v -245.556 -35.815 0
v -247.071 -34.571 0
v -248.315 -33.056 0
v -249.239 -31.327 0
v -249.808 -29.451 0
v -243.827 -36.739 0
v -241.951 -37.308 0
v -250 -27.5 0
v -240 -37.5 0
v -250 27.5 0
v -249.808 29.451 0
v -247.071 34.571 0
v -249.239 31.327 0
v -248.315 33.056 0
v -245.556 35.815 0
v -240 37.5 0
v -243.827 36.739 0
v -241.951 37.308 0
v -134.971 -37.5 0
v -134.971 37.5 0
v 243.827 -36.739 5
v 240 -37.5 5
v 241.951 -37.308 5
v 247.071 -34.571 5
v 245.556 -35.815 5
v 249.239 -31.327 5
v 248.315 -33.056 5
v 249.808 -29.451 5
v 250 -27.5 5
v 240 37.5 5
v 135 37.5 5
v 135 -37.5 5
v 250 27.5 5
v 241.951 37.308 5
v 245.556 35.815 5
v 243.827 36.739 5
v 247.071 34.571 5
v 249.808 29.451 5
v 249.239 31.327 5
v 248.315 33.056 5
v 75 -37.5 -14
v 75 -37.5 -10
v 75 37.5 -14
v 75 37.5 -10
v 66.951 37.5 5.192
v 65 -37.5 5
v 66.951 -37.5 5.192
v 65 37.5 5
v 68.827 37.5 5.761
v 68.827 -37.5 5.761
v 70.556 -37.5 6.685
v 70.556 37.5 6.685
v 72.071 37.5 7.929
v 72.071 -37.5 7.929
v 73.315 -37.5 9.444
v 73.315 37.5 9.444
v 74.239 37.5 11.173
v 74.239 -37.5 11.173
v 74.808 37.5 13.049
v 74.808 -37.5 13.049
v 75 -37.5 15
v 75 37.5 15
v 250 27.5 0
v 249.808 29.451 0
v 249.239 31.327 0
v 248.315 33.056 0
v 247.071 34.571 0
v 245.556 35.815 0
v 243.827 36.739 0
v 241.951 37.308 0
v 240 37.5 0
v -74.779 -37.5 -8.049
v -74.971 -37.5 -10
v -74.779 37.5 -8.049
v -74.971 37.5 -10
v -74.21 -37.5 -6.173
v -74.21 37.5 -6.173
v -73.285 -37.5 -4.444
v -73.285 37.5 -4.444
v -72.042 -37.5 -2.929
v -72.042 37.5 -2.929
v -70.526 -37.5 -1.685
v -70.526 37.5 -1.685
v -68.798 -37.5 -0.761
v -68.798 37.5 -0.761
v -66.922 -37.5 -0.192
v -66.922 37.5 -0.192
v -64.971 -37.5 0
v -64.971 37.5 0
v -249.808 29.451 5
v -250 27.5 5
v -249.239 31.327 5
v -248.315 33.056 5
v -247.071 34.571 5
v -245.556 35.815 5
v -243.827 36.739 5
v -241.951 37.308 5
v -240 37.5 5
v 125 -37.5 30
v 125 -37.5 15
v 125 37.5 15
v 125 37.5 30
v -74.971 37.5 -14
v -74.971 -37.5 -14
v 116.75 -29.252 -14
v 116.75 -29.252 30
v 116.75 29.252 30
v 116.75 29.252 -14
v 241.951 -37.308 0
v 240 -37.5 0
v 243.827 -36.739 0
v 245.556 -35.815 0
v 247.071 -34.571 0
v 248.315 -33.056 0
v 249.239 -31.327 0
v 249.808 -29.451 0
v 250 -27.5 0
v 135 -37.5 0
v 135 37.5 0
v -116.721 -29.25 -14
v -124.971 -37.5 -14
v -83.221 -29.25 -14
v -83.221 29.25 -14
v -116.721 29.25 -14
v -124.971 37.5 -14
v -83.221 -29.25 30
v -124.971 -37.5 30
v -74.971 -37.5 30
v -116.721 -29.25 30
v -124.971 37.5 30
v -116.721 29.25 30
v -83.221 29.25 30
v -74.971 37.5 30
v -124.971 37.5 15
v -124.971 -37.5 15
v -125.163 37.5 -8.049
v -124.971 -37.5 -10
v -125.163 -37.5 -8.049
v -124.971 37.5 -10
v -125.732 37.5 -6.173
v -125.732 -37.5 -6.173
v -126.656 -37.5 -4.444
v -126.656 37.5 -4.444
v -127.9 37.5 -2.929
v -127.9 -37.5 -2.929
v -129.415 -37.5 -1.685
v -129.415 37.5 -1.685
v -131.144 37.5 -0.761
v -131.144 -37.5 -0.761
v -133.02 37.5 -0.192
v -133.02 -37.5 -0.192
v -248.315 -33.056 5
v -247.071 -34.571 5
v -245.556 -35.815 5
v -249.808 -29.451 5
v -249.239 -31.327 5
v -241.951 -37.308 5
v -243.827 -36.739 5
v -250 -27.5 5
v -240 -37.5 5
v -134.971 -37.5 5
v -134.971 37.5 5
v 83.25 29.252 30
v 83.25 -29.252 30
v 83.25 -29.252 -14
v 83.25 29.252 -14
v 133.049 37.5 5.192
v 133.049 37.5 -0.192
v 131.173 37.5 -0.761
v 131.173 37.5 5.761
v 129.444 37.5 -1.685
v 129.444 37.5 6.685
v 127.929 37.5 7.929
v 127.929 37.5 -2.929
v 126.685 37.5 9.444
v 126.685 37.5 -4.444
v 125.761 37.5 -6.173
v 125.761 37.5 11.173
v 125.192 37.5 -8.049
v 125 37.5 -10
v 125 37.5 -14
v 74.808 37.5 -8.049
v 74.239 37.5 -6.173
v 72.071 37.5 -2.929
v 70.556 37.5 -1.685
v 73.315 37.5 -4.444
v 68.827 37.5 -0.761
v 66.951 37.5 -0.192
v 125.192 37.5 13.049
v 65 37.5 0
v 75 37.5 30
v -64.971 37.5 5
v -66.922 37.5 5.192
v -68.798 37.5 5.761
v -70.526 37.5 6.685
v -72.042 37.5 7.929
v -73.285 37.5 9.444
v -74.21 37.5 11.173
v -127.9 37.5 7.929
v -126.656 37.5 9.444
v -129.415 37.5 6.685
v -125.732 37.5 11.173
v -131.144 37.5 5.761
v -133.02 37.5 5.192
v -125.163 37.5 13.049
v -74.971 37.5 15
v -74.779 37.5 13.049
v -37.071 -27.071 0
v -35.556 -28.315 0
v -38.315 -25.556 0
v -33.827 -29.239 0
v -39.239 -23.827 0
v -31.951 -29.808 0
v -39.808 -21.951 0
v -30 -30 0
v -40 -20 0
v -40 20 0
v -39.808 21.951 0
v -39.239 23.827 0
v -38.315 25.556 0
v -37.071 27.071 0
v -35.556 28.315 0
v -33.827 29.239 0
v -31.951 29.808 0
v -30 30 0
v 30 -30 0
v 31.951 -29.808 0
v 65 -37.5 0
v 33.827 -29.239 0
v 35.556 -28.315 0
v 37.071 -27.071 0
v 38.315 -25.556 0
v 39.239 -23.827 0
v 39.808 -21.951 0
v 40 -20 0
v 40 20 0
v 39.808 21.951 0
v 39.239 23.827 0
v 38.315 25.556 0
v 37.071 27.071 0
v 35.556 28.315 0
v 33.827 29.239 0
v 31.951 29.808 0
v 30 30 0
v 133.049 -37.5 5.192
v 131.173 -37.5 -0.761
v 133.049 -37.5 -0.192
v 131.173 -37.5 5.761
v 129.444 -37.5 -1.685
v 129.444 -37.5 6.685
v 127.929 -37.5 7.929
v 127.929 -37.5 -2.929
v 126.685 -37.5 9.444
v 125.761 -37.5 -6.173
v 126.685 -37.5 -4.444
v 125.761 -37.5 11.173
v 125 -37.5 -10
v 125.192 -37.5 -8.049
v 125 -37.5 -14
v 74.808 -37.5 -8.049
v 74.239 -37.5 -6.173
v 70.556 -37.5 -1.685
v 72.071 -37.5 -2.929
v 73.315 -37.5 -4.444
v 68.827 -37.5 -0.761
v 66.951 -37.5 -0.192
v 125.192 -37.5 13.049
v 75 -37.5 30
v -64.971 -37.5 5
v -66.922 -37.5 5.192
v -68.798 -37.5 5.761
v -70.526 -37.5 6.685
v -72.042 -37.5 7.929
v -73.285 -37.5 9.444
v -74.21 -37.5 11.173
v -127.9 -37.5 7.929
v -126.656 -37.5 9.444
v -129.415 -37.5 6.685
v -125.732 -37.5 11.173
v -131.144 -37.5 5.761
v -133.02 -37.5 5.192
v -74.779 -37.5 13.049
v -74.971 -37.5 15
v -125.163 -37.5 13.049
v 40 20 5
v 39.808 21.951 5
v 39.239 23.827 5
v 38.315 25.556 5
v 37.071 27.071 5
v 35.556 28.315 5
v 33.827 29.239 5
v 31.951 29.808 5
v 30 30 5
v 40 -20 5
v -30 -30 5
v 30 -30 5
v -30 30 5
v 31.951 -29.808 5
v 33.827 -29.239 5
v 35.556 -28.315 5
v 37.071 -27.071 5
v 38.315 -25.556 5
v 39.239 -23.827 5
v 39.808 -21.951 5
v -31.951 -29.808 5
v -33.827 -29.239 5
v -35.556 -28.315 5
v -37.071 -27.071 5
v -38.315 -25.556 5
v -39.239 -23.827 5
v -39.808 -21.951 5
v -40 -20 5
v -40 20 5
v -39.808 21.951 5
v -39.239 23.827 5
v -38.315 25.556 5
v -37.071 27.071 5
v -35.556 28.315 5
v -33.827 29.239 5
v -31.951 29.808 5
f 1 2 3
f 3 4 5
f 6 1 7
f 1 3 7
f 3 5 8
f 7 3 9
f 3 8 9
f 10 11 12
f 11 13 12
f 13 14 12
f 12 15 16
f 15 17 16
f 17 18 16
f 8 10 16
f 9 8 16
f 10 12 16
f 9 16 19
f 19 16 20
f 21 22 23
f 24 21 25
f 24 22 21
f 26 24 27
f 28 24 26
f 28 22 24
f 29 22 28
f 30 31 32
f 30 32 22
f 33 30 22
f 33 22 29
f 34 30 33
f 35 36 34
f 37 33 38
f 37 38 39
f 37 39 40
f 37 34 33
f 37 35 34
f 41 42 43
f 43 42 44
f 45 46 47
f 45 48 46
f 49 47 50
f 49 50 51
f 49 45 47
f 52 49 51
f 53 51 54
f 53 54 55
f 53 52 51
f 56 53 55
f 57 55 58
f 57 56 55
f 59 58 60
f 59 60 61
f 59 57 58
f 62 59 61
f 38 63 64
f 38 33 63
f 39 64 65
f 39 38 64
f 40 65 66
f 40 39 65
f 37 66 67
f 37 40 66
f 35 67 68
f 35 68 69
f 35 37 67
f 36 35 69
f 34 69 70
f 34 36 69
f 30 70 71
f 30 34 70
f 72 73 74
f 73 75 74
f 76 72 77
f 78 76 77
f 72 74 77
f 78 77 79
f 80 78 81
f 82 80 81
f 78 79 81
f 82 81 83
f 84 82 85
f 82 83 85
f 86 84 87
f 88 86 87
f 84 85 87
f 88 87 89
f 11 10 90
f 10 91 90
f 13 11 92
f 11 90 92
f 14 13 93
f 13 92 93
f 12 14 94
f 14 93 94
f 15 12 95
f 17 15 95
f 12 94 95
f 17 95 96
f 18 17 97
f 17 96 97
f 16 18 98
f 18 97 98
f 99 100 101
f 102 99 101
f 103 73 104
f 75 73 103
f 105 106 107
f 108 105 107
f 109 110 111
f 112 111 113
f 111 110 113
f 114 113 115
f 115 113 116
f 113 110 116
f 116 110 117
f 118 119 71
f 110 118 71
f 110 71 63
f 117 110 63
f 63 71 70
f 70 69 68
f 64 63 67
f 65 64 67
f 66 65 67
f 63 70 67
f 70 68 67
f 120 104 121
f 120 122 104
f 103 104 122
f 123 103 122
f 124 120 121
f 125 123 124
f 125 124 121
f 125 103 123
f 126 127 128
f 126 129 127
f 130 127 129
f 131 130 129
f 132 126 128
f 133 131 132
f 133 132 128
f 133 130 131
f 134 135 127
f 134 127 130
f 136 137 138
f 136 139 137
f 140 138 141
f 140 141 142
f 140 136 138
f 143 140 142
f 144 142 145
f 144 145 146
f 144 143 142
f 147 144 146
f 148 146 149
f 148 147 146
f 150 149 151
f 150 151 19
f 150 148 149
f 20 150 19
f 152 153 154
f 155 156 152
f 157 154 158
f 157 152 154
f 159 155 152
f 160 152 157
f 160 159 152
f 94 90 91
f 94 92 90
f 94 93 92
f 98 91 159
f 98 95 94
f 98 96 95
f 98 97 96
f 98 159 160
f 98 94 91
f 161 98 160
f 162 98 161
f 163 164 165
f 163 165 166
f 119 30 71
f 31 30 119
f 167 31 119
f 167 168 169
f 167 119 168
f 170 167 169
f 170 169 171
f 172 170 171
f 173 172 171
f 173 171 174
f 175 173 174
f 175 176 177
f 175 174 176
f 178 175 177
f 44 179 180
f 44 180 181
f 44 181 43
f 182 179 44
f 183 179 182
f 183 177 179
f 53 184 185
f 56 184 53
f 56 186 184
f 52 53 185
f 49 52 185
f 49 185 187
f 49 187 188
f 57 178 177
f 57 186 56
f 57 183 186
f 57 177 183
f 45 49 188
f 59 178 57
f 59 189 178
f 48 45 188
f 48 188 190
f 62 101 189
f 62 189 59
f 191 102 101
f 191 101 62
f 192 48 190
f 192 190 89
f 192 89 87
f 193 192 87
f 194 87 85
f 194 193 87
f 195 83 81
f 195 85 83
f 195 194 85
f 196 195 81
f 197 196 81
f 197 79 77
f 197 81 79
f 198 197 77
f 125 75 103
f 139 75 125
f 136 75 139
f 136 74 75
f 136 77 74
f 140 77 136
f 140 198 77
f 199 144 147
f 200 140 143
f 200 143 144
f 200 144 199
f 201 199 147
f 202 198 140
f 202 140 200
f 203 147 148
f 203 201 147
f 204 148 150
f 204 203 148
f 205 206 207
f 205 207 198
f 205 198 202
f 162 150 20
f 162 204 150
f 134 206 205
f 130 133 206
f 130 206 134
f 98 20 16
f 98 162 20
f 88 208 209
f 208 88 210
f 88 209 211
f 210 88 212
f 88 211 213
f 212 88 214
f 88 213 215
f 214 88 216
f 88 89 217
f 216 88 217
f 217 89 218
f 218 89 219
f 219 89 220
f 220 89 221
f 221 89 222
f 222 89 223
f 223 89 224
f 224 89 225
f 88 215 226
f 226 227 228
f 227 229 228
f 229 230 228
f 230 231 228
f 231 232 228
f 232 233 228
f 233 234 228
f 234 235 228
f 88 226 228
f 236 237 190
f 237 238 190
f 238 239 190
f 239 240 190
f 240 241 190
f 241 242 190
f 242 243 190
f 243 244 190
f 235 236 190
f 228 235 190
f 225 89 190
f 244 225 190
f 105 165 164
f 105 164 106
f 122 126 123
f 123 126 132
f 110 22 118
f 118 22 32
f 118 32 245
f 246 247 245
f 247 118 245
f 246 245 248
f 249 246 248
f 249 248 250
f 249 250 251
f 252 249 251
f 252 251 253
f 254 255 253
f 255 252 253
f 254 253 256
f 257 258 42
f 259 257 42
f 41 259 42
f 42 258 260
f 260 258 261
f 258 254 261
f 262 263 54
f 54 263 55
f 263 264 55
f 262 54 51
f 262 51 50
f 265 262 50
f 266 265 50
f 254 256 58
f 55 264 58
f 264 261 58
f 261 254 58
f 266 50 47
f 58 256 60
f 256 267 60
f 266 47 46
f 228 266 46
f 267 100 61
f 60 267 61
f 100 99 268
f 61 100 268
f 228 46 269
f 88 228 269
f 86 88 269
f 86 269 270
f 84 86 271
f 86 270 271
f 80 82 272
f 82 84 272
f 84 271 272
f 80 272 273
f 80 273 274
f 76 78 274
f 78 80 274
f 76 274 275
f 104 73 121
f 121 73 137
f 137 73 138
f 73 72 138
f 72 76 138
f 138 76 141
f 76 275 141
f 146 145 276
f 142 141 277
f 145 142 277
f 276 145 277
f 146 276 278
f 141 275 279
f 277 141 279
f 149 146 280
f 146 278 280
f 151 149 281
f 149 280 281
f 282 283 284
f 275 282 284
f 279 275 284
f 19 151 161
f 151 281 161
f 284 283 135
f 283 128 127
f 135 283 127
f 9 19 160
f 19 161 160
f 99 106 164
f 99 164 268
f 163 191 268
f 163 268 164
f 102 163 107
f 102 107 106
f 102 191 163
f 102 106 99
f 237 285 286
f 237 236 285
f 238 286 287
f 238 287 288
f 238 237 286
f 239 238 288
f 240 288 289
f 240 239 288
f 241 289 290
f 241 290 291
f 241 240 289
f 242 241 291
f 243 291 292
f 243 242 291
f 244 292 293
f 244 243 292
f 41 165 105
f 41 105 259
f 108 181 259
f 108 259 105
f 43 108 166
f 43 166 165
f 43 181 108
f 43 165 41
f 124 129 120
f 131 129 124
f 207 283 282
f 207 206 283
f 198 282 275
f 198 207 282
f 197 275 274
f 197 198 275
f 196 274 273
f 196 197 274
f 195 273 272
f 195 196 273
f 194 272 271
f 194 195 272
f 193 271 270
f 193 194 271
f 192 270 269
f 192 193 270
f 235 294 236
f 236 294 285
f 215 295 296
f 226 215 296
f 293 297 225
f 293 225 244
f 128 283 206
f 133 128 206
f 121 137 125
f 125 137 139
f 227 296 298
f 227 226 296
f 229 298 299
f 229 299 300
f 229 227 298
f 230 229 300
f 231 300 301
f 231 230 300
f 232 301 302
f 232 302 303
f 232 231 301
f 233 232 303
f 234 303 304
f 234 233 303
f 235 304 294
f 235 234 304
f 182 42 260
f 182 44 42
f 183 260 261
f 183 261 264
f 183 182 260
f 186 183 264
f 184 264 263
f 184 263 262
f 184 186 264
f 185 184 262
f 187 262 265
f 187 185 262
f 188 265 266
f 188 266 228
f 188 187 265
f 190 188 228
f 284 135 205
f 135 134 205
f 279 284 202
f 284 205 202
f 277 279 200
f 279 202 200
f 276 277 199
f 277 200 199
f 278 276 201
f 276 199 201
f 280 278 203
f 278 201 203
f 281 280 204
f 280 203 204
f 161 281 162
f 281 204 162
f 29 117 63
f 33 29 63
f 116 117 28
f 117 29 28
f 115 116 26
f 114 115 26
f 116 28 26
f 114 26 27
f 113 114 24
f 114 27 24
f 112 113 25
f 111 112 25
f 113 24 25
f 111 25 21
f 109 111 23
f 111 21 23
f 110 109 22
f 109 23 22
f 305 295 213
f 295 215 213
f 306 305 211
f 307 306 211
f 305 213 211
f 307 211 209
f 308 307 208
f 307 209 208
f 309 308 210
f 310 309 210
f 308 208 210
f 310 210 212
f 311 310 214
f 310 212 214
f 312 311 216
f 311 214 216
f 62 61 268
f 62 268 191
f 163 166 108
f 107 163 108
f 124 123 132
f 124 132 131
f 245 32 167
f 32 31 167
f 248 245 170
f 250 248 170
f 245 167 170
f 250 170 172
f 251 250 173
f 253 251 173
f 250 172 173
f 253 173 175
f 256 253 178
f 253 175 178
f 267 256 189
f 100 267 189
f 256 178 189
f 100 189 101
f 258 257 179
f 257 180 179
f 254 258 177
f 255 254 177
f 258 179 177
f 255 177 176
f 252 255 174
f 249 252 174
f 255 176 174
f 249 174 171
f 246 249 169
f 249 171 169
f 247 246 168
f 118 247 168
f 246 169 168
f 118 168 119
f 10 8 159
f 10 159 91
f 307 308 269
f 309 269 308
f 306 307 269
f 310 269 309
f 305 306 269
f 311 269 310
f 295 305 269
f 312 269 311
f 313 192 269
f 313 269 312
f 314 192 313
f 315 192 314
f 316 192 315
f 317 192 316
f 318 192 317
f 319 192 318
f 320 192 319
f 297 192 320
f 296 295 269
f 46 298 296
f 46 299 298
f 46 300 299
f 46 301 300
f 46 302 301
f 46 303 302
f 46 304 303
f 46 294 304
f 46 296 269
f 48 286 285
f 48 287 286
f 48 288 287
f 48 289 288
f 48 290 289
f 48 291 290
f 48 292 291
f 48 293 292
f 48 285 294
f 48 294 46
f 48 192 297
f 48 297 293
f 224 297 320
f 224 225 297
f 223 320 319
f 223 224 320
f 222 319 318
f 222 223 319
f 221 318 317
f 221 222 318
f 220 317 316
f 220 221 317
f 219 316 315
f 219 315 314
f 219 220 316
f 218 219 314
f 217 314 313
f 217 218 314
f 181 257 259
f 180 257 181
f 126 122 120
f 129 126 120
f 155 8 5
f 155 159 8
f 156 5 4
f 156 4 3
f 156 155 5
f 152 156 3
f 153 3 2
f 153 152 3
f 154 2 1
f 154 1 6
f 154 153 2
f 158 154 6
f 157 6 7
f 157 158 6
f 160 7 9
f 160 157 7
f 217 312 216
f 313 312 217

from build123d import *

# Parameters (mm, degrees)
SKETCH1_W           = 500
SKETCH1_H           = 75
BOSS_EXTRUDE1_DEPTH = 5
SKETCH2_W           = 33.5
SKETCH2_H           = 58.5
SKETCH2_H_2         = 58.503478076
CUT_EXTRUDE1_DEPTH  = 5
SKETCH3_W           = 50
SKETCH3_H           = 75
SKETCH3_W_2         = 33.5
SKETCH3_H_2         = 58.5
SKETCH3_H_3         = 58.503478076
BOSS_EXTRUDE4_DEPTH = 25
SKETCH5_W           = 50
SKETCH5_H           = 75
SKETCH5_W_2         = 33.5
SKETCH5_H_2         = 58.5
SKETCH5_H_3         = 58.503478076
BOSS_EXTRUDE5_DEPTH = 14
FILLET1_R           = 10
FILLET2_R           = 10
SKETCH6_W           = 80
SKETCH6_H           = 60
CUT_EXTRUDE3_DEPTH  = 380
FILLET3_R           = 10


with BuildPart() as part:
    # Sketch1 → Boss-Extrude1 (new body)
    with BuildSketch(Plane.XY):
        Rectangle(SKETCH1_W, SKETCH1_H)
    extrude(amount=BOSS_EXTRUDE1_DEPTH)

    # Sketch2 → Cut-Extrude1 (cut)
    with BuildSketch(Plane.XY.offset(5)):
        with Locations((-99.970770454, 0)):
            Rectangle(SKETCH2_W, SKETCH2_H)
        with Locations((100, 0)):
            Rectangle(SKETCH2_W, SKETCH2_H_2)
    extrude(amount=-CUT_EXTRUDE1_DEPTH, mode=Mode.SUBTRACT)

    # Sketch3 → Boss-Extrude4 (add)
    with BuildSketch(Plane.XY.offset(5)):
        with Locations((-99.970770454, 0)):
            Rectangle(SKETCH3_W, SKETCH3_H)
        with Locations((-99.970770454, 0)):
            Rectangle(SKETCH3_W_2, SKETCH3_H_2, mode=Mode.SUBTRACT)
        with Locations((100, 0)):
            Rectangle(SKETCH3_W, SKETCH3_H)
        with Locations((100, 0)):
            Rectangle(SKETCH3_W_2, SKETCH3_H_3, mode=Mode.SUBTRACT)
    extrude(amount=BOSS_EXTRUDE4_DEPTH)

    # Sketch5 → Boss-Extrude5 (add)
    with BuildSketch(Plane(origin=(0, 0, 0), x_dir=(-1, 0, 0), z_dir=(0, 0, -1))):
        with Locations((99.970770454, 0)):
            Rectangle(SKETCH5_W, SKETCH5_H)
        with Locations((99.970770454, 0)):
            Rectangle(SKETCH5_W_2, SKETCH5_H_2, mode=Mode.SUBTRACT)
        with Locations((-100, 0)):
            Rectangle(SKETCH5_W, SKETCH5_H)
        with Locations((-100, 0)):
            Rectangle(SKETCH5_W_2, SKETCH5_H_3, mode=Mode.SUBTRACT)
    extrude(amount=BOSS_EXTRUDE5_DEPTH)

    # Fillet1
    fillet1_edges = [part.edges().sort_by_distance(p)[0] for p in [
        (75, 0, 0),
        (125, 0, 0),
        (-74.970770454, 0, 5),
        (-124.970770454, 0, 5),
        (125, 0, 5),
        (75, 0, 5),
        (250, -37.5, 2.5),
        (-250, -37.5, 2.5),
        (-250, 37.5, 2.5),
        (250, 37.5, 2.5),
        (-74.970770454, 0, 0),
    ]]
    fillet(fillet1_edges, radius=FILLET1_R)

    # Fillet2
    fillet2_edges = [part.edges().sort_by_distance(p)[0] for p in [
        (-124.970770454, 0, 0),
    ]]
    fillet(fillet2_edges, radius=FILLET2_R)

    # Sketch6 → Cut-Extrude3 (cut)
    with BuildSketch(Plane.XY.offset(5)):
        Rectangle(SKETCH6_W, SKETCH6_H)
    extrude(amount=-CUT_EXTRUDE3_DEPTH, mode=Mode.SUBTRACT)

    # Fillet3
    fillet3_edges = [part.edges().sort_by_distance(p)[0] for p in [
        (40, 30, 2.5),
        (40, -30, 2.5),
        (-40, -30, 2.5),
        (-40, 30, 2.5),
    ]]
    fillet(fillet3_edges, radius=FILLET3_R)


solid = part.part
